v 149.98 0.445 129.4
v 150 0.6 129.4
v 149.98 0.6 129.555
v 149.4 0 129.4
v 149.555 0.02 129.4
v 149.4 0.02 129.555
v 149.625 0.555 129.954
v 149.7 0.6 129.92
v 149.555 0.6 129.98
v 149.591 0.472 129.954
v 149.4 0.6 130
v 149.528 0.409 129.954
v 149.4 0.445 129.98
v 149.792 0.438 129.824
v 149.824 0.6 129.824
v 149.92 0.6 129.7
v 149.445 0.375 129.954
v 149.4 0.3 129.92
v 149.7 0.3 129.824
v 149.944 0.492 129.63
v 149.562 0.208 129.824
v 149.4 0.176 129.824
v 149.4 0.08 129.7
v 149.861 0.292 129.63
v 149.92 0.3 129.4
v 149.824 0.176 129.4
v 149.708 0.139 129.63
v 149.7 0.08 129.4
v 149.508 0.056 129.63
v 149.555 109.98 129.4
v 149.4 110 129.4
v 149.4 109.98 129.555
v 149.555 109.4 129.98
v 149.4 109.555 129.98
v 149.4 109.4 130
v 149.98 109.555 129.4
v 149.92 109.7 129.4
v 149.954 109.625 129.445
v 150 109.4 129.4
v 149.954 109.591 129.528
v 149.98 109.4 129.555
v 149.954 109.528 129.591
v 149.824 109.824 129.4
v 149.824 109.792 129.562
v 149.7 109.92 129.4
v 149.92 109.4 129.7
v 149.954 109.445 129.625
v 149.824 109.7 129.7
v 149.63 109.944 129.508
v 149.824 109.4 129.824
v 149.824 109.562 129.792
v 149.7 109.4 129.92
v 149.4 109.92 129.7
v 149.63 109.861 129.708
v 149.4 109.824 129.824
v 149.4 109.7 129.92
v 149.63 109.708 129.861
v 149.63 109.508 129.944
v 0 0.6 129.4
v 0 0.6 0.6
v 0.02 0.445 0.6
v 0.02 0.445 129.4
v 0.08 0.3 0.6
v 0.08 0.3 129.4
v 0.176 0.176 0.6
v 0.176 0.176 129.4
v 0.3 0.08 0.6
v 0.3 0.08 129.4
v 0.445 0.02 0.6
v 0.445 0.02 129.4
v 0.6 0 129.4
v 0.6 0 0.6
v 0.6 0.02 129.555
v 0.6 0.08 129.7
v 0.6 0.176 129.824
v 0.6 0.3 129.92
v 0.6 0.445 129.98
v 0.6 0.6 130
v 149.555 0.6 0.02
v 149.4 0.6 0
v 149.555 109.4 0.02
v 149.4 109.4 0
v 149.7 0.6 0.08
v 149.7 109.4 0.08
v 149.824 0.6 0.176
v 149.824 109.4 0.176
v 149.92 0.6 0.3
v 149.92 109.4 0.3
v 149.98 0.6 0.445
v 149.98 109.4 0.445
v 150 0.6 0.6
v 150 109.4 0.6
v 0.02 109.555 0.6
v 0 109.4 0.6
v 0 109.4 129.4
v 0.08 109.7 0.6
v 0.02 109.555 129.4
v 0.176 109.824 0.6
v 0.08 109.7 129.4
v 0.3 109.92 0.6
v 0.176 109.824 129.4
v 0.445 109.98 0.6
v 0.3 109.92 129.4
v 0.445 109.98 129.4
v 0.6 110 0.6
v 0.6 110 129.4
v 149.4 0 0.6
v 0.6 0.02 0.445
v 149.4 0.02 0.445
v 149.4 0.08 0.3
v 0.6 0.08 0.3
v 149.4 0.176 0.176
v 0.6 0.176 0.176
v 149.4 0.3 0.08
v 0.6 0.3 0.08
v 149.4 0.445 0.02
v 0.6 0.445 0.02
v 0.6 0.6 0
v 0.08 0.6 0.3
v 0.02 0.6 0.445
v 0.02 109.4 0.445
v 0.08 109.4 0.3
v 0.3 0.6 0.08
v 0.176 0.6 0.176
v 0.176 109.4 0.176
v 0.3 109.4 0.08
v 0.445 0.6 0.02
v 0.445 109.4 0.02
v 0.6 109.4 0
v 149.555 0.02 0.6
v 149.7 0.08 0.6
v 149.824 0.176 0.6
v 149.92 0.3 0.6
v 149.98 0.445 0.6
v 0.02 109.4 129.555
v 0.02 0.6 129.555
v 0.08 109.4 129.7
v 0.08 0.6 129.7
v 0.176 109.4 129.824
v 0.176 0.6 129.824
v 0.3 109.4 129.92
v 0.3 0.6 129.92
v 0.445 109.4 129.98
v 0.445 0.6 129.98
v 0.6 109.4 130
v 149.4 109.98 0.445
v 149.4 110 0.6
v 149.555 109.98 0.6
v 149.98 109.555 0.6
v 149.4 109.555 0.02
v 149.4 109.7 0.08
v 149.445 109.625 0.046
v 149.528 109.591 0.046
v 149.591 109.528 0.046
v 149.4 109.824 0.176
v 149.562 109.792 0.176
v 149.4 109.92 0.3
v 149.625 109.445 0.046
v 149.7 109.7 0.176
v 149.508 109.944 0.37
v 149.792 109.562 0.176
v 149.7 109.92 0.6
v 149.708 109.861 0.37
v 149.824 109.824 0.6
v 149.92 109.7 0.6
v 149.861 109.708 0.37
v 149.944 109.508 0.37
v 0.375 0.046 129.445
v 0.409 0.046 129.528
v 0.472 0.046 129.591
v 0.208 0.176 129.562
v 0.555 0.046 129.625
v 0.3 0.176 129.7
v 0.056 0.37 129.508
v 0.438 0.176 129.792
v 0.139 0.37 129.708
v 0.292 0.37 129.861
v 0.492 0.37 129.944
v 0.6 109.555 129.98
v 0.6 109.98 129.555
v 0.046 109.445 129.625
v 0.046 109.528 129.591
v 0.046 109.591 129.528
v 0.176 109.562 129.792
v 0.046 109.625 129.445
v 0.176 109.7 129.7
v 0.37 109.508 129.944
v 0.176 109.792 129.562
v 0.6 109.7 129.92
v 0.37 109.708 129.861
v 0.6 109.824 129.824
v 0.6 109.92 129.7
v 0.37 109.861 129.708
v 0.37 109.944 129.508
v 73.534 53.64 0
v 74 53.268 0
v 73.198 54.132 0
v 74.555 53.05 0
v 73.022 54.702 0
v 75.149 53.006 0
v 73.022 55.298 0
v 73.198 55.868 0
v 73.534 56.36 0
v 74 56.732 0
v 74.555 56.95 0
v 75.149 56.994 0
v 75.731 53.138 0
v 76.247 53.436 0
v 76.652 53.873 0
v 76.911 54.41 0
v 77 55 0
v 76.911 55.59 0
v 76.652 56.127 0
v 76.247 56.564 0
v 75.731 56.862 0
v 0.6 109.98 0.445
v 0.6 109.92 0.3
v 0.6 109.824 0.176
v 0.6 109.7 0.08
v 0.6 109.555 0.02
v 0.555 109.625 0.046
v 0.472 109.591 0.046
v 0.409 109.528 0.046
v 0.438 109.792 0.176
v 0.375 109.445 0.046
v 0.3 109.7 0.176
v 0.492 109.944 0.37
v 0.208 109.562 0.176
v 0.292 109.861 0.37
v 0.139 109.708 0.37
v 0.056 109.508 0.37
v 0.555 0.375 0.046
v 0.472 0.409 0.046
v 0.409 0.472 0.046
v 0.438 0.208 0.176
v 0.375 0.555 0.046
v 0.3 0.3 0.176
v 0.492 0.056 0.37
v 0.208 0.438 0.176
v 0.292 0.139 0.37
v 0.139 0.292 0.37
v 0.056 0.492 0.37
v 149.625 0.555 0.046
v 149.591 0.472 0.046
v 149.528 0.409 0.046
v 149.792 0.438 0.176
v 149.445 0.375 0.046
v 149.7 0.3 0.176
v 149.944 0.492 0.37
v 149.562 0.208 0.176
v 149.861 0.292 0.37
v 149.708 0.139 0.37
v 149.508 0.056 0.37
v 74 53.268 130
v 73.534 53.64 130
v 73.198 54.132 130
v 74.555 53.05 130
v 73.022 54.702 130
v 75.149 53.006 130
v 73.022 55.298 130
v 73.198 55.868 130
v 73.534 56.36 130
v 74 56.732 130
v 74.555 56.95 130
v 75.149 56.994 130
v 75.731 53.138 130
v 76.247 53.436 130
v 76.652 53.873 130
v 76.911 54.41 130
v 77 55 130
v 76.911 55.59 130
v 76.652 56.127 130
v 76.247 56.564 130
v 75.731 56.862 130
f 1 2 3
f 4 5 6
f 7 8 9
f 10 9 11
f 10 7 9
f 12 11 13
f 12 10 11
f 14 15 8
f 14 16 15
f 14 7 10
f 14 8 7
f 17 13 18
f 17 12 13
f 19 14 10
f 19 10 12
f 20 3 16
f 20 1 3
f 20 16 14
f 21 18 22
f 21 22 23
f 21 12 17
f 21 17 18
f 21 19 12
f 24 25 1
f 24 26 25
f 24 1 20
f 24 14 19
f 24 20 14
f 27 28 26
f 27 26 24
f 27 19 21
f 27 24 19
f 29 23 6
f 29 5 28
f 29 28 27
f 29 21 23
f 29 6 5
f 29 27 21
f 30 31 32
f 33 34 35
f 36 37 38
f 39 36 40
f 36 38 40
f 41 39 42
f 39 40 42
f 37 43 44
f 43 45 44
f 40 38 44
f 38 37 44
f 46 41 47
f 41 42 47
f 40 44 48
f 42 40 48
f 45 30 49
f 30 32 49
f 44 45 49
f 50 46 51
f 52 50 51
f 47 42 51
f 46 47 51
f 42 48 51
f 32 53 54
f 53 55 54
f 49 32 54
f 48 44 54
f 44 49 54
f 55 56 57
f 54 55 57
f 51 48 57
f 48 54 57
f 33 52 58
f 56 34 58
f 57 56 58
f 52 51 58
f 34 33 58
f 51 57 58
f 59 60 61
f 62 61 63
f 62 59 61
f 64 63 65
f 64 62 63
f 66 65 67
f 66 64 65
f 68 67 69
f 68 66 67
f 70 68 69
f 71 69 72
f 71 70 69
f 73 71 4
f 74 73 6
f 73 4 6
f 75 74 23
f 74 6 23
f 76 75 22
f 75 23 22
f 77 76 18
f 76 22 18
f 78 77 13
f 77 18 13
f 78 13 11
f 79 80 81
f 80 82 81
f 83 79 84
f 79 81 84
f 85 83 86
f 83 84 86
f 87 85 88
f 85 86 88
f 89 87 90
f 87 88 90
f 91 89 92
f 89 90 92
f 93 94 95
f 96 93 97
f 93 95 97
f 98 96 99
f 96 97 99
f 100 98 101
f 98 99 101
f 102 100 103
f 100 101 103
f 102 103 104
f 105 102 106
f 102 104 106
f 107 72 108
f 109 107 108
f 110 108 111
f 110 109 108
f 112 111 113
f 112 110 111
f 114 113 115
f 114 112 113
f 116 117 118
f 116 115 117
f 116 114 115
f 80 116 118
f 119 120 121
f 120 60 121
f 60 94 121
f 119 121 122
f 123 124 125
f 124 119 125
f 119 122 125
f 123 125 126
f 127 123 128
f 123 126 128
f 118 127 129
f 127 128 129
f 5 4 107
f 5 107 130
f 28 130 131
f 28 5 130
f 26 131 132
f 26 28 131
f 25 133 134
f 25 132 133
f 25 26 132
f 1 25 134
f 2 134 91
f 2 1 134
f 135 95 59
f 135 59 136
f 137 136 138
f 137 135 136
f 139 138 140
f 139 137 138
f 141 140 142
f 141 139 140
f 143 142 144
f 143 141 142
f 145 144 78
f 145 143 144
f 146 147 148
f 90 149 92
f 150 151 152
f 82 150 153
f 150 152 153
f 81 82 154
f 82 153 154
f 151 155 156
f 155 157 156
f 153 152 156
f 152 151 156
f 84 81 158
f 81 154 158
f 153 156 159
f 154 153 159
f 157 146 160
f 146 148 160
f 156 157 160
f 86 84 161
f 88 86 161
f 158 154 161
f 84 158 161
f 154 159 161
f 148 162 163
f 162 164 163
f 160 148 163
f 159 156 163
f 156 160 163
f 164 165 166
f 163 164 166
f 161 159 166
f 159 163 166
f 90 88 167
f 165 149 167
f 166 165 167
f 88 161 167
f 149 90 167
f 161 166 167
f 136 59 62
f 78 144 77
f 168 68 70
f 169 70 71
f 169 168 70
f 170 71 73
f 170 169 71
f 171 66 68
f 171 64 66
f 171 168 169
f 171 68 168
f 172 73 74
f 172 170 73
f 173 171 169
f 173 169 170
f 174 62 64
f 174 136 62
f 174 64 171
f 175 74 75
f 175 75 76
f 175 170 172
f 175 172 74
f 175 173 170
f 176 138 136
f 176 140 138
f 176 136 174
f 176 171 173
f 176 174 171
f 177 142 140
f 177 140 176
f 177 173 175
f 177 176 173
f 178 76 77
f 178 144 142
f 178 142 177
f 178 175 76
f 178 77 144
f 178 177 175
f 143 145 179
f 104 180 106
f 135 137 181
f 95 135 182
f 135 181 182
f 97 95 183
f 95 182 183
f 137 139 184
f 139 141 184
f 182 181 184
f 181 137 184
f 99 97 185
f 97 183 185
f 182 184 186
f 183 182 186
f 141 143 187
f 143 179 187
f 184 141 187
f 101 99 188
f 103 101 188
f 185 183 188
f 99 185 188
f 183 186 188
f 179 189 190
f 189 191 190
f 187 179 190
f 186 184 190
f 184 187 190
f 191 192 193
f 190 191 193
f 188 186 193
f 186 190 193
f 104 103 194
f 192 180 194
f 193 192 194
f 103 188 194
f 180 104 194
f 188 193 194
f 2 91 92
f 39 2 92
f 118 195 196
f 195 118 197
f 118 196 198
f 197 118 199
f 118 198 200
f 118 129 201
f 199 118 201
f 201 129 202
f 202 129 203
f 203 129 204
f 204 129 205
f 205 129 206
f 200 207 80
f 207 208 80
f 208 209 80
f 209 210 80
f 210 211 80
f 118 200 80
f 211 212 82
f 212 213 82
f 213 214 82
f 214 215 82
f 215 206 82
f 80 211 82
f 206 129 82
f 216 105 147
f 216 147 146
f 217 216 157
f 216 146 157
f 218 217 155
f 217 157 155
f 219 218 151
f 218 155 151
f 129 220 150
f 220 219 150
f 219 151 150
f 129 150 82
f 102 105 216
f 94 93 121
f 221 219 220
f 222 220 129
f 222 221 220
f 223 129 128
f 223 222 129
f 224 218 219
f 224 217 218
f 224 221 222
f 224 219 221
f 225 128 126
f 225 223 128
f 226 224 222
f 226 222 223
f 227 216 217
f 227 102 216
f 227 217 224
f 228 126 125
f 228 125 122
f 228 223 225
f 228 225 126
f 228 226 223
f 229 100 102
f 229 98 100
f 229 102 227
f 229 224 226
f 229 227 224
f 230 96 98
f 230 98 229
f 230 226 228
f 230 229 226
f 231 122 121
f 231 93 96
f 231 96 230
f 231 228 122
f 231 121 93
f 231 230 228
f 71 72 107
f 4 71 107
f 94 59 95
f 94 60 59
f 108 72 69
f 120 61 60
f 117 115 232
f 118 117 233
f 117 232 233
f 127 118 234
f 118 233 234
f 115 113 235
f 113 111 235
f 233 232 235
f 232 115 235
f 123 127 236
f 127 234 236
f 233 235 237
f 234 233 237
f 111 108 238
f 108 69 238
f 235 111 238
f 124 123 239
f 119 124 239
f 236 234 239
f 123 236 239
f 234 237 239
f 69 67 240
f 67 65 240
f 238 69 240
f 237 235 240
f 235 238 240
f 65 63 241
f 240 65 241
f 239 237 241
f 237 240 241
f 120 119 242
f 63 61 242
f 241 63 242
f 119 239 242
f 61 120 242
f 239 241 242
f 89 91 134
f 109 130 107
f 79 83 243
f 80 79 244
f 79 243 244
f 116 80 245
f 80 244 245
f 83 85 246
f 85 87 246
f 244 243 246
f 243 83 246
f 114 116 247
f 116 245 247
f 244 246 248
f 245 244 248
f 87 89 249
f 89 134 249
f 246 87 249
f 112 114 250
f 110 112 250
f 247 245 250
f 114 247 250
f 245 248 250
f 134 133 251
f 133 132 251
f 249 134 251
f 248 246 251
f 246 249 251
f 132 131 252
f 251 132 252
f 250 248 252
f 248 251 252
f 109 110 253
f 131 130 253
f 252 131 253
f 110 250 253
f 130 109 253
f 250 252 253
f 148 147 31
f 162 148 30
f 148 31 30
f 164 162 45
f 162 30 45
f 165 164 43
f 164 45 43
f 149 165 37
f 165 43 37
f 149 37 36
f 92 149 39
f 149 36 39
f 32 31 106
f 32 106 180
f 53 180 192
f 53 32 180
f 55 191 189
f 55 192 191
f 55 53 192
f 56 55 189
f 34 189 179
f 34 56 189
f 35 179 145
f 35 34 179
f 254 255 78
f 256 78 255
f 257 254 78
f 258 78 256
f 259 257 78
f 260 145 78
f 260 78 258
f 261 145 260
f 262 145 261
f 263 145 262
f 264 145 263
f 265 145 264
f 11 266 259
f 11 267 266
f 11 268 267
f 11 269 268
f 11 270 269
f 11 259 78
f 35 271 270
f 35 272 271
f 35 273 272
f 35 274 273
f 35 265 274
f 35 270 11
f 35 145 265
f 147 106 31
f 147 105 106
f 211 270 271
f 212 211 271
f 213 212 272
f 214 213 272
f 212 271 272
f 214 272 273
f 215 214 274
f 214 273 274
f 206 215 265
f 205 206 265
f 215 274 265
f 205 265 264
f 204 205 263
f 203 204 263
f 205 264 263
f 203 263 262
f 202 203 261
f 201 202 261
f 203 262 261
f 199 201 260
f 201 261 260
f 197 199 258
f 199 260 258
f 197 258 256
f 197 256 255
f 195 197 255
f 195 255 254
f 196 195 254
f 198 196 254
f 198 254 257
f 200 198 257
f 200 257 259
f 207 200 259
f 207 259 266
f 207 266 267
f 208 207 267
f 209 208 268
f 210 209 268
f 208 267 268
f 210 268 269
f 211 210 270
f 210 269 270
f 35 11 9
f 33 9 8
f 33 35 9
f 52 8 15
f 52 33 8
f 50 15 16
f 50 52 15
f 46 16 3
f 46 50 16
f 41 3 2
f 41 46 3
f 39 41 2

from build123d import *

# Parameters (mm, degrees)
F0_W     = 150
F0_H     = 110
F1_DEPTH = 130
F2_R     = 2
F3_DEPTH = 130
F4_R     = 0.6


with BuildPart() as f1:
    # F0 (on Top) → F1 (new body)
    with BuildSketch(Plane.XY):
        with Locations((75, 55)):
            Rectangle(F0_W, F0_H)
    extrude(amount=F1_DEPTH)

    # F2 (on face) → F3 (cut)
    with BuildSketch(Plane.XY.offset(130)):
        with Locations((75, 55)):
            Circle(F2_R)
    extrude(amount=-F3_DEPTH, mode=Mode.SUBTRACT)

    # F4
    f4_edges = [f1.edges().sort_by_distance(p)[0] for p in [
        (75, 110, 130),
        (0, 55, 130),
        (150, 110, 65),
        (0, 110, 65),
        (75, 110, 0),
        (150, 0, 65),
        (150, 55, 0),
        (150, 55, 130),
        (0, 0, 65),
        (75, 0, 0),
        (75, 0, 130),
        (0, 55, 0),
    ]]
    fillet(f4_edges, radius=F4_R)


solid = f1.part
